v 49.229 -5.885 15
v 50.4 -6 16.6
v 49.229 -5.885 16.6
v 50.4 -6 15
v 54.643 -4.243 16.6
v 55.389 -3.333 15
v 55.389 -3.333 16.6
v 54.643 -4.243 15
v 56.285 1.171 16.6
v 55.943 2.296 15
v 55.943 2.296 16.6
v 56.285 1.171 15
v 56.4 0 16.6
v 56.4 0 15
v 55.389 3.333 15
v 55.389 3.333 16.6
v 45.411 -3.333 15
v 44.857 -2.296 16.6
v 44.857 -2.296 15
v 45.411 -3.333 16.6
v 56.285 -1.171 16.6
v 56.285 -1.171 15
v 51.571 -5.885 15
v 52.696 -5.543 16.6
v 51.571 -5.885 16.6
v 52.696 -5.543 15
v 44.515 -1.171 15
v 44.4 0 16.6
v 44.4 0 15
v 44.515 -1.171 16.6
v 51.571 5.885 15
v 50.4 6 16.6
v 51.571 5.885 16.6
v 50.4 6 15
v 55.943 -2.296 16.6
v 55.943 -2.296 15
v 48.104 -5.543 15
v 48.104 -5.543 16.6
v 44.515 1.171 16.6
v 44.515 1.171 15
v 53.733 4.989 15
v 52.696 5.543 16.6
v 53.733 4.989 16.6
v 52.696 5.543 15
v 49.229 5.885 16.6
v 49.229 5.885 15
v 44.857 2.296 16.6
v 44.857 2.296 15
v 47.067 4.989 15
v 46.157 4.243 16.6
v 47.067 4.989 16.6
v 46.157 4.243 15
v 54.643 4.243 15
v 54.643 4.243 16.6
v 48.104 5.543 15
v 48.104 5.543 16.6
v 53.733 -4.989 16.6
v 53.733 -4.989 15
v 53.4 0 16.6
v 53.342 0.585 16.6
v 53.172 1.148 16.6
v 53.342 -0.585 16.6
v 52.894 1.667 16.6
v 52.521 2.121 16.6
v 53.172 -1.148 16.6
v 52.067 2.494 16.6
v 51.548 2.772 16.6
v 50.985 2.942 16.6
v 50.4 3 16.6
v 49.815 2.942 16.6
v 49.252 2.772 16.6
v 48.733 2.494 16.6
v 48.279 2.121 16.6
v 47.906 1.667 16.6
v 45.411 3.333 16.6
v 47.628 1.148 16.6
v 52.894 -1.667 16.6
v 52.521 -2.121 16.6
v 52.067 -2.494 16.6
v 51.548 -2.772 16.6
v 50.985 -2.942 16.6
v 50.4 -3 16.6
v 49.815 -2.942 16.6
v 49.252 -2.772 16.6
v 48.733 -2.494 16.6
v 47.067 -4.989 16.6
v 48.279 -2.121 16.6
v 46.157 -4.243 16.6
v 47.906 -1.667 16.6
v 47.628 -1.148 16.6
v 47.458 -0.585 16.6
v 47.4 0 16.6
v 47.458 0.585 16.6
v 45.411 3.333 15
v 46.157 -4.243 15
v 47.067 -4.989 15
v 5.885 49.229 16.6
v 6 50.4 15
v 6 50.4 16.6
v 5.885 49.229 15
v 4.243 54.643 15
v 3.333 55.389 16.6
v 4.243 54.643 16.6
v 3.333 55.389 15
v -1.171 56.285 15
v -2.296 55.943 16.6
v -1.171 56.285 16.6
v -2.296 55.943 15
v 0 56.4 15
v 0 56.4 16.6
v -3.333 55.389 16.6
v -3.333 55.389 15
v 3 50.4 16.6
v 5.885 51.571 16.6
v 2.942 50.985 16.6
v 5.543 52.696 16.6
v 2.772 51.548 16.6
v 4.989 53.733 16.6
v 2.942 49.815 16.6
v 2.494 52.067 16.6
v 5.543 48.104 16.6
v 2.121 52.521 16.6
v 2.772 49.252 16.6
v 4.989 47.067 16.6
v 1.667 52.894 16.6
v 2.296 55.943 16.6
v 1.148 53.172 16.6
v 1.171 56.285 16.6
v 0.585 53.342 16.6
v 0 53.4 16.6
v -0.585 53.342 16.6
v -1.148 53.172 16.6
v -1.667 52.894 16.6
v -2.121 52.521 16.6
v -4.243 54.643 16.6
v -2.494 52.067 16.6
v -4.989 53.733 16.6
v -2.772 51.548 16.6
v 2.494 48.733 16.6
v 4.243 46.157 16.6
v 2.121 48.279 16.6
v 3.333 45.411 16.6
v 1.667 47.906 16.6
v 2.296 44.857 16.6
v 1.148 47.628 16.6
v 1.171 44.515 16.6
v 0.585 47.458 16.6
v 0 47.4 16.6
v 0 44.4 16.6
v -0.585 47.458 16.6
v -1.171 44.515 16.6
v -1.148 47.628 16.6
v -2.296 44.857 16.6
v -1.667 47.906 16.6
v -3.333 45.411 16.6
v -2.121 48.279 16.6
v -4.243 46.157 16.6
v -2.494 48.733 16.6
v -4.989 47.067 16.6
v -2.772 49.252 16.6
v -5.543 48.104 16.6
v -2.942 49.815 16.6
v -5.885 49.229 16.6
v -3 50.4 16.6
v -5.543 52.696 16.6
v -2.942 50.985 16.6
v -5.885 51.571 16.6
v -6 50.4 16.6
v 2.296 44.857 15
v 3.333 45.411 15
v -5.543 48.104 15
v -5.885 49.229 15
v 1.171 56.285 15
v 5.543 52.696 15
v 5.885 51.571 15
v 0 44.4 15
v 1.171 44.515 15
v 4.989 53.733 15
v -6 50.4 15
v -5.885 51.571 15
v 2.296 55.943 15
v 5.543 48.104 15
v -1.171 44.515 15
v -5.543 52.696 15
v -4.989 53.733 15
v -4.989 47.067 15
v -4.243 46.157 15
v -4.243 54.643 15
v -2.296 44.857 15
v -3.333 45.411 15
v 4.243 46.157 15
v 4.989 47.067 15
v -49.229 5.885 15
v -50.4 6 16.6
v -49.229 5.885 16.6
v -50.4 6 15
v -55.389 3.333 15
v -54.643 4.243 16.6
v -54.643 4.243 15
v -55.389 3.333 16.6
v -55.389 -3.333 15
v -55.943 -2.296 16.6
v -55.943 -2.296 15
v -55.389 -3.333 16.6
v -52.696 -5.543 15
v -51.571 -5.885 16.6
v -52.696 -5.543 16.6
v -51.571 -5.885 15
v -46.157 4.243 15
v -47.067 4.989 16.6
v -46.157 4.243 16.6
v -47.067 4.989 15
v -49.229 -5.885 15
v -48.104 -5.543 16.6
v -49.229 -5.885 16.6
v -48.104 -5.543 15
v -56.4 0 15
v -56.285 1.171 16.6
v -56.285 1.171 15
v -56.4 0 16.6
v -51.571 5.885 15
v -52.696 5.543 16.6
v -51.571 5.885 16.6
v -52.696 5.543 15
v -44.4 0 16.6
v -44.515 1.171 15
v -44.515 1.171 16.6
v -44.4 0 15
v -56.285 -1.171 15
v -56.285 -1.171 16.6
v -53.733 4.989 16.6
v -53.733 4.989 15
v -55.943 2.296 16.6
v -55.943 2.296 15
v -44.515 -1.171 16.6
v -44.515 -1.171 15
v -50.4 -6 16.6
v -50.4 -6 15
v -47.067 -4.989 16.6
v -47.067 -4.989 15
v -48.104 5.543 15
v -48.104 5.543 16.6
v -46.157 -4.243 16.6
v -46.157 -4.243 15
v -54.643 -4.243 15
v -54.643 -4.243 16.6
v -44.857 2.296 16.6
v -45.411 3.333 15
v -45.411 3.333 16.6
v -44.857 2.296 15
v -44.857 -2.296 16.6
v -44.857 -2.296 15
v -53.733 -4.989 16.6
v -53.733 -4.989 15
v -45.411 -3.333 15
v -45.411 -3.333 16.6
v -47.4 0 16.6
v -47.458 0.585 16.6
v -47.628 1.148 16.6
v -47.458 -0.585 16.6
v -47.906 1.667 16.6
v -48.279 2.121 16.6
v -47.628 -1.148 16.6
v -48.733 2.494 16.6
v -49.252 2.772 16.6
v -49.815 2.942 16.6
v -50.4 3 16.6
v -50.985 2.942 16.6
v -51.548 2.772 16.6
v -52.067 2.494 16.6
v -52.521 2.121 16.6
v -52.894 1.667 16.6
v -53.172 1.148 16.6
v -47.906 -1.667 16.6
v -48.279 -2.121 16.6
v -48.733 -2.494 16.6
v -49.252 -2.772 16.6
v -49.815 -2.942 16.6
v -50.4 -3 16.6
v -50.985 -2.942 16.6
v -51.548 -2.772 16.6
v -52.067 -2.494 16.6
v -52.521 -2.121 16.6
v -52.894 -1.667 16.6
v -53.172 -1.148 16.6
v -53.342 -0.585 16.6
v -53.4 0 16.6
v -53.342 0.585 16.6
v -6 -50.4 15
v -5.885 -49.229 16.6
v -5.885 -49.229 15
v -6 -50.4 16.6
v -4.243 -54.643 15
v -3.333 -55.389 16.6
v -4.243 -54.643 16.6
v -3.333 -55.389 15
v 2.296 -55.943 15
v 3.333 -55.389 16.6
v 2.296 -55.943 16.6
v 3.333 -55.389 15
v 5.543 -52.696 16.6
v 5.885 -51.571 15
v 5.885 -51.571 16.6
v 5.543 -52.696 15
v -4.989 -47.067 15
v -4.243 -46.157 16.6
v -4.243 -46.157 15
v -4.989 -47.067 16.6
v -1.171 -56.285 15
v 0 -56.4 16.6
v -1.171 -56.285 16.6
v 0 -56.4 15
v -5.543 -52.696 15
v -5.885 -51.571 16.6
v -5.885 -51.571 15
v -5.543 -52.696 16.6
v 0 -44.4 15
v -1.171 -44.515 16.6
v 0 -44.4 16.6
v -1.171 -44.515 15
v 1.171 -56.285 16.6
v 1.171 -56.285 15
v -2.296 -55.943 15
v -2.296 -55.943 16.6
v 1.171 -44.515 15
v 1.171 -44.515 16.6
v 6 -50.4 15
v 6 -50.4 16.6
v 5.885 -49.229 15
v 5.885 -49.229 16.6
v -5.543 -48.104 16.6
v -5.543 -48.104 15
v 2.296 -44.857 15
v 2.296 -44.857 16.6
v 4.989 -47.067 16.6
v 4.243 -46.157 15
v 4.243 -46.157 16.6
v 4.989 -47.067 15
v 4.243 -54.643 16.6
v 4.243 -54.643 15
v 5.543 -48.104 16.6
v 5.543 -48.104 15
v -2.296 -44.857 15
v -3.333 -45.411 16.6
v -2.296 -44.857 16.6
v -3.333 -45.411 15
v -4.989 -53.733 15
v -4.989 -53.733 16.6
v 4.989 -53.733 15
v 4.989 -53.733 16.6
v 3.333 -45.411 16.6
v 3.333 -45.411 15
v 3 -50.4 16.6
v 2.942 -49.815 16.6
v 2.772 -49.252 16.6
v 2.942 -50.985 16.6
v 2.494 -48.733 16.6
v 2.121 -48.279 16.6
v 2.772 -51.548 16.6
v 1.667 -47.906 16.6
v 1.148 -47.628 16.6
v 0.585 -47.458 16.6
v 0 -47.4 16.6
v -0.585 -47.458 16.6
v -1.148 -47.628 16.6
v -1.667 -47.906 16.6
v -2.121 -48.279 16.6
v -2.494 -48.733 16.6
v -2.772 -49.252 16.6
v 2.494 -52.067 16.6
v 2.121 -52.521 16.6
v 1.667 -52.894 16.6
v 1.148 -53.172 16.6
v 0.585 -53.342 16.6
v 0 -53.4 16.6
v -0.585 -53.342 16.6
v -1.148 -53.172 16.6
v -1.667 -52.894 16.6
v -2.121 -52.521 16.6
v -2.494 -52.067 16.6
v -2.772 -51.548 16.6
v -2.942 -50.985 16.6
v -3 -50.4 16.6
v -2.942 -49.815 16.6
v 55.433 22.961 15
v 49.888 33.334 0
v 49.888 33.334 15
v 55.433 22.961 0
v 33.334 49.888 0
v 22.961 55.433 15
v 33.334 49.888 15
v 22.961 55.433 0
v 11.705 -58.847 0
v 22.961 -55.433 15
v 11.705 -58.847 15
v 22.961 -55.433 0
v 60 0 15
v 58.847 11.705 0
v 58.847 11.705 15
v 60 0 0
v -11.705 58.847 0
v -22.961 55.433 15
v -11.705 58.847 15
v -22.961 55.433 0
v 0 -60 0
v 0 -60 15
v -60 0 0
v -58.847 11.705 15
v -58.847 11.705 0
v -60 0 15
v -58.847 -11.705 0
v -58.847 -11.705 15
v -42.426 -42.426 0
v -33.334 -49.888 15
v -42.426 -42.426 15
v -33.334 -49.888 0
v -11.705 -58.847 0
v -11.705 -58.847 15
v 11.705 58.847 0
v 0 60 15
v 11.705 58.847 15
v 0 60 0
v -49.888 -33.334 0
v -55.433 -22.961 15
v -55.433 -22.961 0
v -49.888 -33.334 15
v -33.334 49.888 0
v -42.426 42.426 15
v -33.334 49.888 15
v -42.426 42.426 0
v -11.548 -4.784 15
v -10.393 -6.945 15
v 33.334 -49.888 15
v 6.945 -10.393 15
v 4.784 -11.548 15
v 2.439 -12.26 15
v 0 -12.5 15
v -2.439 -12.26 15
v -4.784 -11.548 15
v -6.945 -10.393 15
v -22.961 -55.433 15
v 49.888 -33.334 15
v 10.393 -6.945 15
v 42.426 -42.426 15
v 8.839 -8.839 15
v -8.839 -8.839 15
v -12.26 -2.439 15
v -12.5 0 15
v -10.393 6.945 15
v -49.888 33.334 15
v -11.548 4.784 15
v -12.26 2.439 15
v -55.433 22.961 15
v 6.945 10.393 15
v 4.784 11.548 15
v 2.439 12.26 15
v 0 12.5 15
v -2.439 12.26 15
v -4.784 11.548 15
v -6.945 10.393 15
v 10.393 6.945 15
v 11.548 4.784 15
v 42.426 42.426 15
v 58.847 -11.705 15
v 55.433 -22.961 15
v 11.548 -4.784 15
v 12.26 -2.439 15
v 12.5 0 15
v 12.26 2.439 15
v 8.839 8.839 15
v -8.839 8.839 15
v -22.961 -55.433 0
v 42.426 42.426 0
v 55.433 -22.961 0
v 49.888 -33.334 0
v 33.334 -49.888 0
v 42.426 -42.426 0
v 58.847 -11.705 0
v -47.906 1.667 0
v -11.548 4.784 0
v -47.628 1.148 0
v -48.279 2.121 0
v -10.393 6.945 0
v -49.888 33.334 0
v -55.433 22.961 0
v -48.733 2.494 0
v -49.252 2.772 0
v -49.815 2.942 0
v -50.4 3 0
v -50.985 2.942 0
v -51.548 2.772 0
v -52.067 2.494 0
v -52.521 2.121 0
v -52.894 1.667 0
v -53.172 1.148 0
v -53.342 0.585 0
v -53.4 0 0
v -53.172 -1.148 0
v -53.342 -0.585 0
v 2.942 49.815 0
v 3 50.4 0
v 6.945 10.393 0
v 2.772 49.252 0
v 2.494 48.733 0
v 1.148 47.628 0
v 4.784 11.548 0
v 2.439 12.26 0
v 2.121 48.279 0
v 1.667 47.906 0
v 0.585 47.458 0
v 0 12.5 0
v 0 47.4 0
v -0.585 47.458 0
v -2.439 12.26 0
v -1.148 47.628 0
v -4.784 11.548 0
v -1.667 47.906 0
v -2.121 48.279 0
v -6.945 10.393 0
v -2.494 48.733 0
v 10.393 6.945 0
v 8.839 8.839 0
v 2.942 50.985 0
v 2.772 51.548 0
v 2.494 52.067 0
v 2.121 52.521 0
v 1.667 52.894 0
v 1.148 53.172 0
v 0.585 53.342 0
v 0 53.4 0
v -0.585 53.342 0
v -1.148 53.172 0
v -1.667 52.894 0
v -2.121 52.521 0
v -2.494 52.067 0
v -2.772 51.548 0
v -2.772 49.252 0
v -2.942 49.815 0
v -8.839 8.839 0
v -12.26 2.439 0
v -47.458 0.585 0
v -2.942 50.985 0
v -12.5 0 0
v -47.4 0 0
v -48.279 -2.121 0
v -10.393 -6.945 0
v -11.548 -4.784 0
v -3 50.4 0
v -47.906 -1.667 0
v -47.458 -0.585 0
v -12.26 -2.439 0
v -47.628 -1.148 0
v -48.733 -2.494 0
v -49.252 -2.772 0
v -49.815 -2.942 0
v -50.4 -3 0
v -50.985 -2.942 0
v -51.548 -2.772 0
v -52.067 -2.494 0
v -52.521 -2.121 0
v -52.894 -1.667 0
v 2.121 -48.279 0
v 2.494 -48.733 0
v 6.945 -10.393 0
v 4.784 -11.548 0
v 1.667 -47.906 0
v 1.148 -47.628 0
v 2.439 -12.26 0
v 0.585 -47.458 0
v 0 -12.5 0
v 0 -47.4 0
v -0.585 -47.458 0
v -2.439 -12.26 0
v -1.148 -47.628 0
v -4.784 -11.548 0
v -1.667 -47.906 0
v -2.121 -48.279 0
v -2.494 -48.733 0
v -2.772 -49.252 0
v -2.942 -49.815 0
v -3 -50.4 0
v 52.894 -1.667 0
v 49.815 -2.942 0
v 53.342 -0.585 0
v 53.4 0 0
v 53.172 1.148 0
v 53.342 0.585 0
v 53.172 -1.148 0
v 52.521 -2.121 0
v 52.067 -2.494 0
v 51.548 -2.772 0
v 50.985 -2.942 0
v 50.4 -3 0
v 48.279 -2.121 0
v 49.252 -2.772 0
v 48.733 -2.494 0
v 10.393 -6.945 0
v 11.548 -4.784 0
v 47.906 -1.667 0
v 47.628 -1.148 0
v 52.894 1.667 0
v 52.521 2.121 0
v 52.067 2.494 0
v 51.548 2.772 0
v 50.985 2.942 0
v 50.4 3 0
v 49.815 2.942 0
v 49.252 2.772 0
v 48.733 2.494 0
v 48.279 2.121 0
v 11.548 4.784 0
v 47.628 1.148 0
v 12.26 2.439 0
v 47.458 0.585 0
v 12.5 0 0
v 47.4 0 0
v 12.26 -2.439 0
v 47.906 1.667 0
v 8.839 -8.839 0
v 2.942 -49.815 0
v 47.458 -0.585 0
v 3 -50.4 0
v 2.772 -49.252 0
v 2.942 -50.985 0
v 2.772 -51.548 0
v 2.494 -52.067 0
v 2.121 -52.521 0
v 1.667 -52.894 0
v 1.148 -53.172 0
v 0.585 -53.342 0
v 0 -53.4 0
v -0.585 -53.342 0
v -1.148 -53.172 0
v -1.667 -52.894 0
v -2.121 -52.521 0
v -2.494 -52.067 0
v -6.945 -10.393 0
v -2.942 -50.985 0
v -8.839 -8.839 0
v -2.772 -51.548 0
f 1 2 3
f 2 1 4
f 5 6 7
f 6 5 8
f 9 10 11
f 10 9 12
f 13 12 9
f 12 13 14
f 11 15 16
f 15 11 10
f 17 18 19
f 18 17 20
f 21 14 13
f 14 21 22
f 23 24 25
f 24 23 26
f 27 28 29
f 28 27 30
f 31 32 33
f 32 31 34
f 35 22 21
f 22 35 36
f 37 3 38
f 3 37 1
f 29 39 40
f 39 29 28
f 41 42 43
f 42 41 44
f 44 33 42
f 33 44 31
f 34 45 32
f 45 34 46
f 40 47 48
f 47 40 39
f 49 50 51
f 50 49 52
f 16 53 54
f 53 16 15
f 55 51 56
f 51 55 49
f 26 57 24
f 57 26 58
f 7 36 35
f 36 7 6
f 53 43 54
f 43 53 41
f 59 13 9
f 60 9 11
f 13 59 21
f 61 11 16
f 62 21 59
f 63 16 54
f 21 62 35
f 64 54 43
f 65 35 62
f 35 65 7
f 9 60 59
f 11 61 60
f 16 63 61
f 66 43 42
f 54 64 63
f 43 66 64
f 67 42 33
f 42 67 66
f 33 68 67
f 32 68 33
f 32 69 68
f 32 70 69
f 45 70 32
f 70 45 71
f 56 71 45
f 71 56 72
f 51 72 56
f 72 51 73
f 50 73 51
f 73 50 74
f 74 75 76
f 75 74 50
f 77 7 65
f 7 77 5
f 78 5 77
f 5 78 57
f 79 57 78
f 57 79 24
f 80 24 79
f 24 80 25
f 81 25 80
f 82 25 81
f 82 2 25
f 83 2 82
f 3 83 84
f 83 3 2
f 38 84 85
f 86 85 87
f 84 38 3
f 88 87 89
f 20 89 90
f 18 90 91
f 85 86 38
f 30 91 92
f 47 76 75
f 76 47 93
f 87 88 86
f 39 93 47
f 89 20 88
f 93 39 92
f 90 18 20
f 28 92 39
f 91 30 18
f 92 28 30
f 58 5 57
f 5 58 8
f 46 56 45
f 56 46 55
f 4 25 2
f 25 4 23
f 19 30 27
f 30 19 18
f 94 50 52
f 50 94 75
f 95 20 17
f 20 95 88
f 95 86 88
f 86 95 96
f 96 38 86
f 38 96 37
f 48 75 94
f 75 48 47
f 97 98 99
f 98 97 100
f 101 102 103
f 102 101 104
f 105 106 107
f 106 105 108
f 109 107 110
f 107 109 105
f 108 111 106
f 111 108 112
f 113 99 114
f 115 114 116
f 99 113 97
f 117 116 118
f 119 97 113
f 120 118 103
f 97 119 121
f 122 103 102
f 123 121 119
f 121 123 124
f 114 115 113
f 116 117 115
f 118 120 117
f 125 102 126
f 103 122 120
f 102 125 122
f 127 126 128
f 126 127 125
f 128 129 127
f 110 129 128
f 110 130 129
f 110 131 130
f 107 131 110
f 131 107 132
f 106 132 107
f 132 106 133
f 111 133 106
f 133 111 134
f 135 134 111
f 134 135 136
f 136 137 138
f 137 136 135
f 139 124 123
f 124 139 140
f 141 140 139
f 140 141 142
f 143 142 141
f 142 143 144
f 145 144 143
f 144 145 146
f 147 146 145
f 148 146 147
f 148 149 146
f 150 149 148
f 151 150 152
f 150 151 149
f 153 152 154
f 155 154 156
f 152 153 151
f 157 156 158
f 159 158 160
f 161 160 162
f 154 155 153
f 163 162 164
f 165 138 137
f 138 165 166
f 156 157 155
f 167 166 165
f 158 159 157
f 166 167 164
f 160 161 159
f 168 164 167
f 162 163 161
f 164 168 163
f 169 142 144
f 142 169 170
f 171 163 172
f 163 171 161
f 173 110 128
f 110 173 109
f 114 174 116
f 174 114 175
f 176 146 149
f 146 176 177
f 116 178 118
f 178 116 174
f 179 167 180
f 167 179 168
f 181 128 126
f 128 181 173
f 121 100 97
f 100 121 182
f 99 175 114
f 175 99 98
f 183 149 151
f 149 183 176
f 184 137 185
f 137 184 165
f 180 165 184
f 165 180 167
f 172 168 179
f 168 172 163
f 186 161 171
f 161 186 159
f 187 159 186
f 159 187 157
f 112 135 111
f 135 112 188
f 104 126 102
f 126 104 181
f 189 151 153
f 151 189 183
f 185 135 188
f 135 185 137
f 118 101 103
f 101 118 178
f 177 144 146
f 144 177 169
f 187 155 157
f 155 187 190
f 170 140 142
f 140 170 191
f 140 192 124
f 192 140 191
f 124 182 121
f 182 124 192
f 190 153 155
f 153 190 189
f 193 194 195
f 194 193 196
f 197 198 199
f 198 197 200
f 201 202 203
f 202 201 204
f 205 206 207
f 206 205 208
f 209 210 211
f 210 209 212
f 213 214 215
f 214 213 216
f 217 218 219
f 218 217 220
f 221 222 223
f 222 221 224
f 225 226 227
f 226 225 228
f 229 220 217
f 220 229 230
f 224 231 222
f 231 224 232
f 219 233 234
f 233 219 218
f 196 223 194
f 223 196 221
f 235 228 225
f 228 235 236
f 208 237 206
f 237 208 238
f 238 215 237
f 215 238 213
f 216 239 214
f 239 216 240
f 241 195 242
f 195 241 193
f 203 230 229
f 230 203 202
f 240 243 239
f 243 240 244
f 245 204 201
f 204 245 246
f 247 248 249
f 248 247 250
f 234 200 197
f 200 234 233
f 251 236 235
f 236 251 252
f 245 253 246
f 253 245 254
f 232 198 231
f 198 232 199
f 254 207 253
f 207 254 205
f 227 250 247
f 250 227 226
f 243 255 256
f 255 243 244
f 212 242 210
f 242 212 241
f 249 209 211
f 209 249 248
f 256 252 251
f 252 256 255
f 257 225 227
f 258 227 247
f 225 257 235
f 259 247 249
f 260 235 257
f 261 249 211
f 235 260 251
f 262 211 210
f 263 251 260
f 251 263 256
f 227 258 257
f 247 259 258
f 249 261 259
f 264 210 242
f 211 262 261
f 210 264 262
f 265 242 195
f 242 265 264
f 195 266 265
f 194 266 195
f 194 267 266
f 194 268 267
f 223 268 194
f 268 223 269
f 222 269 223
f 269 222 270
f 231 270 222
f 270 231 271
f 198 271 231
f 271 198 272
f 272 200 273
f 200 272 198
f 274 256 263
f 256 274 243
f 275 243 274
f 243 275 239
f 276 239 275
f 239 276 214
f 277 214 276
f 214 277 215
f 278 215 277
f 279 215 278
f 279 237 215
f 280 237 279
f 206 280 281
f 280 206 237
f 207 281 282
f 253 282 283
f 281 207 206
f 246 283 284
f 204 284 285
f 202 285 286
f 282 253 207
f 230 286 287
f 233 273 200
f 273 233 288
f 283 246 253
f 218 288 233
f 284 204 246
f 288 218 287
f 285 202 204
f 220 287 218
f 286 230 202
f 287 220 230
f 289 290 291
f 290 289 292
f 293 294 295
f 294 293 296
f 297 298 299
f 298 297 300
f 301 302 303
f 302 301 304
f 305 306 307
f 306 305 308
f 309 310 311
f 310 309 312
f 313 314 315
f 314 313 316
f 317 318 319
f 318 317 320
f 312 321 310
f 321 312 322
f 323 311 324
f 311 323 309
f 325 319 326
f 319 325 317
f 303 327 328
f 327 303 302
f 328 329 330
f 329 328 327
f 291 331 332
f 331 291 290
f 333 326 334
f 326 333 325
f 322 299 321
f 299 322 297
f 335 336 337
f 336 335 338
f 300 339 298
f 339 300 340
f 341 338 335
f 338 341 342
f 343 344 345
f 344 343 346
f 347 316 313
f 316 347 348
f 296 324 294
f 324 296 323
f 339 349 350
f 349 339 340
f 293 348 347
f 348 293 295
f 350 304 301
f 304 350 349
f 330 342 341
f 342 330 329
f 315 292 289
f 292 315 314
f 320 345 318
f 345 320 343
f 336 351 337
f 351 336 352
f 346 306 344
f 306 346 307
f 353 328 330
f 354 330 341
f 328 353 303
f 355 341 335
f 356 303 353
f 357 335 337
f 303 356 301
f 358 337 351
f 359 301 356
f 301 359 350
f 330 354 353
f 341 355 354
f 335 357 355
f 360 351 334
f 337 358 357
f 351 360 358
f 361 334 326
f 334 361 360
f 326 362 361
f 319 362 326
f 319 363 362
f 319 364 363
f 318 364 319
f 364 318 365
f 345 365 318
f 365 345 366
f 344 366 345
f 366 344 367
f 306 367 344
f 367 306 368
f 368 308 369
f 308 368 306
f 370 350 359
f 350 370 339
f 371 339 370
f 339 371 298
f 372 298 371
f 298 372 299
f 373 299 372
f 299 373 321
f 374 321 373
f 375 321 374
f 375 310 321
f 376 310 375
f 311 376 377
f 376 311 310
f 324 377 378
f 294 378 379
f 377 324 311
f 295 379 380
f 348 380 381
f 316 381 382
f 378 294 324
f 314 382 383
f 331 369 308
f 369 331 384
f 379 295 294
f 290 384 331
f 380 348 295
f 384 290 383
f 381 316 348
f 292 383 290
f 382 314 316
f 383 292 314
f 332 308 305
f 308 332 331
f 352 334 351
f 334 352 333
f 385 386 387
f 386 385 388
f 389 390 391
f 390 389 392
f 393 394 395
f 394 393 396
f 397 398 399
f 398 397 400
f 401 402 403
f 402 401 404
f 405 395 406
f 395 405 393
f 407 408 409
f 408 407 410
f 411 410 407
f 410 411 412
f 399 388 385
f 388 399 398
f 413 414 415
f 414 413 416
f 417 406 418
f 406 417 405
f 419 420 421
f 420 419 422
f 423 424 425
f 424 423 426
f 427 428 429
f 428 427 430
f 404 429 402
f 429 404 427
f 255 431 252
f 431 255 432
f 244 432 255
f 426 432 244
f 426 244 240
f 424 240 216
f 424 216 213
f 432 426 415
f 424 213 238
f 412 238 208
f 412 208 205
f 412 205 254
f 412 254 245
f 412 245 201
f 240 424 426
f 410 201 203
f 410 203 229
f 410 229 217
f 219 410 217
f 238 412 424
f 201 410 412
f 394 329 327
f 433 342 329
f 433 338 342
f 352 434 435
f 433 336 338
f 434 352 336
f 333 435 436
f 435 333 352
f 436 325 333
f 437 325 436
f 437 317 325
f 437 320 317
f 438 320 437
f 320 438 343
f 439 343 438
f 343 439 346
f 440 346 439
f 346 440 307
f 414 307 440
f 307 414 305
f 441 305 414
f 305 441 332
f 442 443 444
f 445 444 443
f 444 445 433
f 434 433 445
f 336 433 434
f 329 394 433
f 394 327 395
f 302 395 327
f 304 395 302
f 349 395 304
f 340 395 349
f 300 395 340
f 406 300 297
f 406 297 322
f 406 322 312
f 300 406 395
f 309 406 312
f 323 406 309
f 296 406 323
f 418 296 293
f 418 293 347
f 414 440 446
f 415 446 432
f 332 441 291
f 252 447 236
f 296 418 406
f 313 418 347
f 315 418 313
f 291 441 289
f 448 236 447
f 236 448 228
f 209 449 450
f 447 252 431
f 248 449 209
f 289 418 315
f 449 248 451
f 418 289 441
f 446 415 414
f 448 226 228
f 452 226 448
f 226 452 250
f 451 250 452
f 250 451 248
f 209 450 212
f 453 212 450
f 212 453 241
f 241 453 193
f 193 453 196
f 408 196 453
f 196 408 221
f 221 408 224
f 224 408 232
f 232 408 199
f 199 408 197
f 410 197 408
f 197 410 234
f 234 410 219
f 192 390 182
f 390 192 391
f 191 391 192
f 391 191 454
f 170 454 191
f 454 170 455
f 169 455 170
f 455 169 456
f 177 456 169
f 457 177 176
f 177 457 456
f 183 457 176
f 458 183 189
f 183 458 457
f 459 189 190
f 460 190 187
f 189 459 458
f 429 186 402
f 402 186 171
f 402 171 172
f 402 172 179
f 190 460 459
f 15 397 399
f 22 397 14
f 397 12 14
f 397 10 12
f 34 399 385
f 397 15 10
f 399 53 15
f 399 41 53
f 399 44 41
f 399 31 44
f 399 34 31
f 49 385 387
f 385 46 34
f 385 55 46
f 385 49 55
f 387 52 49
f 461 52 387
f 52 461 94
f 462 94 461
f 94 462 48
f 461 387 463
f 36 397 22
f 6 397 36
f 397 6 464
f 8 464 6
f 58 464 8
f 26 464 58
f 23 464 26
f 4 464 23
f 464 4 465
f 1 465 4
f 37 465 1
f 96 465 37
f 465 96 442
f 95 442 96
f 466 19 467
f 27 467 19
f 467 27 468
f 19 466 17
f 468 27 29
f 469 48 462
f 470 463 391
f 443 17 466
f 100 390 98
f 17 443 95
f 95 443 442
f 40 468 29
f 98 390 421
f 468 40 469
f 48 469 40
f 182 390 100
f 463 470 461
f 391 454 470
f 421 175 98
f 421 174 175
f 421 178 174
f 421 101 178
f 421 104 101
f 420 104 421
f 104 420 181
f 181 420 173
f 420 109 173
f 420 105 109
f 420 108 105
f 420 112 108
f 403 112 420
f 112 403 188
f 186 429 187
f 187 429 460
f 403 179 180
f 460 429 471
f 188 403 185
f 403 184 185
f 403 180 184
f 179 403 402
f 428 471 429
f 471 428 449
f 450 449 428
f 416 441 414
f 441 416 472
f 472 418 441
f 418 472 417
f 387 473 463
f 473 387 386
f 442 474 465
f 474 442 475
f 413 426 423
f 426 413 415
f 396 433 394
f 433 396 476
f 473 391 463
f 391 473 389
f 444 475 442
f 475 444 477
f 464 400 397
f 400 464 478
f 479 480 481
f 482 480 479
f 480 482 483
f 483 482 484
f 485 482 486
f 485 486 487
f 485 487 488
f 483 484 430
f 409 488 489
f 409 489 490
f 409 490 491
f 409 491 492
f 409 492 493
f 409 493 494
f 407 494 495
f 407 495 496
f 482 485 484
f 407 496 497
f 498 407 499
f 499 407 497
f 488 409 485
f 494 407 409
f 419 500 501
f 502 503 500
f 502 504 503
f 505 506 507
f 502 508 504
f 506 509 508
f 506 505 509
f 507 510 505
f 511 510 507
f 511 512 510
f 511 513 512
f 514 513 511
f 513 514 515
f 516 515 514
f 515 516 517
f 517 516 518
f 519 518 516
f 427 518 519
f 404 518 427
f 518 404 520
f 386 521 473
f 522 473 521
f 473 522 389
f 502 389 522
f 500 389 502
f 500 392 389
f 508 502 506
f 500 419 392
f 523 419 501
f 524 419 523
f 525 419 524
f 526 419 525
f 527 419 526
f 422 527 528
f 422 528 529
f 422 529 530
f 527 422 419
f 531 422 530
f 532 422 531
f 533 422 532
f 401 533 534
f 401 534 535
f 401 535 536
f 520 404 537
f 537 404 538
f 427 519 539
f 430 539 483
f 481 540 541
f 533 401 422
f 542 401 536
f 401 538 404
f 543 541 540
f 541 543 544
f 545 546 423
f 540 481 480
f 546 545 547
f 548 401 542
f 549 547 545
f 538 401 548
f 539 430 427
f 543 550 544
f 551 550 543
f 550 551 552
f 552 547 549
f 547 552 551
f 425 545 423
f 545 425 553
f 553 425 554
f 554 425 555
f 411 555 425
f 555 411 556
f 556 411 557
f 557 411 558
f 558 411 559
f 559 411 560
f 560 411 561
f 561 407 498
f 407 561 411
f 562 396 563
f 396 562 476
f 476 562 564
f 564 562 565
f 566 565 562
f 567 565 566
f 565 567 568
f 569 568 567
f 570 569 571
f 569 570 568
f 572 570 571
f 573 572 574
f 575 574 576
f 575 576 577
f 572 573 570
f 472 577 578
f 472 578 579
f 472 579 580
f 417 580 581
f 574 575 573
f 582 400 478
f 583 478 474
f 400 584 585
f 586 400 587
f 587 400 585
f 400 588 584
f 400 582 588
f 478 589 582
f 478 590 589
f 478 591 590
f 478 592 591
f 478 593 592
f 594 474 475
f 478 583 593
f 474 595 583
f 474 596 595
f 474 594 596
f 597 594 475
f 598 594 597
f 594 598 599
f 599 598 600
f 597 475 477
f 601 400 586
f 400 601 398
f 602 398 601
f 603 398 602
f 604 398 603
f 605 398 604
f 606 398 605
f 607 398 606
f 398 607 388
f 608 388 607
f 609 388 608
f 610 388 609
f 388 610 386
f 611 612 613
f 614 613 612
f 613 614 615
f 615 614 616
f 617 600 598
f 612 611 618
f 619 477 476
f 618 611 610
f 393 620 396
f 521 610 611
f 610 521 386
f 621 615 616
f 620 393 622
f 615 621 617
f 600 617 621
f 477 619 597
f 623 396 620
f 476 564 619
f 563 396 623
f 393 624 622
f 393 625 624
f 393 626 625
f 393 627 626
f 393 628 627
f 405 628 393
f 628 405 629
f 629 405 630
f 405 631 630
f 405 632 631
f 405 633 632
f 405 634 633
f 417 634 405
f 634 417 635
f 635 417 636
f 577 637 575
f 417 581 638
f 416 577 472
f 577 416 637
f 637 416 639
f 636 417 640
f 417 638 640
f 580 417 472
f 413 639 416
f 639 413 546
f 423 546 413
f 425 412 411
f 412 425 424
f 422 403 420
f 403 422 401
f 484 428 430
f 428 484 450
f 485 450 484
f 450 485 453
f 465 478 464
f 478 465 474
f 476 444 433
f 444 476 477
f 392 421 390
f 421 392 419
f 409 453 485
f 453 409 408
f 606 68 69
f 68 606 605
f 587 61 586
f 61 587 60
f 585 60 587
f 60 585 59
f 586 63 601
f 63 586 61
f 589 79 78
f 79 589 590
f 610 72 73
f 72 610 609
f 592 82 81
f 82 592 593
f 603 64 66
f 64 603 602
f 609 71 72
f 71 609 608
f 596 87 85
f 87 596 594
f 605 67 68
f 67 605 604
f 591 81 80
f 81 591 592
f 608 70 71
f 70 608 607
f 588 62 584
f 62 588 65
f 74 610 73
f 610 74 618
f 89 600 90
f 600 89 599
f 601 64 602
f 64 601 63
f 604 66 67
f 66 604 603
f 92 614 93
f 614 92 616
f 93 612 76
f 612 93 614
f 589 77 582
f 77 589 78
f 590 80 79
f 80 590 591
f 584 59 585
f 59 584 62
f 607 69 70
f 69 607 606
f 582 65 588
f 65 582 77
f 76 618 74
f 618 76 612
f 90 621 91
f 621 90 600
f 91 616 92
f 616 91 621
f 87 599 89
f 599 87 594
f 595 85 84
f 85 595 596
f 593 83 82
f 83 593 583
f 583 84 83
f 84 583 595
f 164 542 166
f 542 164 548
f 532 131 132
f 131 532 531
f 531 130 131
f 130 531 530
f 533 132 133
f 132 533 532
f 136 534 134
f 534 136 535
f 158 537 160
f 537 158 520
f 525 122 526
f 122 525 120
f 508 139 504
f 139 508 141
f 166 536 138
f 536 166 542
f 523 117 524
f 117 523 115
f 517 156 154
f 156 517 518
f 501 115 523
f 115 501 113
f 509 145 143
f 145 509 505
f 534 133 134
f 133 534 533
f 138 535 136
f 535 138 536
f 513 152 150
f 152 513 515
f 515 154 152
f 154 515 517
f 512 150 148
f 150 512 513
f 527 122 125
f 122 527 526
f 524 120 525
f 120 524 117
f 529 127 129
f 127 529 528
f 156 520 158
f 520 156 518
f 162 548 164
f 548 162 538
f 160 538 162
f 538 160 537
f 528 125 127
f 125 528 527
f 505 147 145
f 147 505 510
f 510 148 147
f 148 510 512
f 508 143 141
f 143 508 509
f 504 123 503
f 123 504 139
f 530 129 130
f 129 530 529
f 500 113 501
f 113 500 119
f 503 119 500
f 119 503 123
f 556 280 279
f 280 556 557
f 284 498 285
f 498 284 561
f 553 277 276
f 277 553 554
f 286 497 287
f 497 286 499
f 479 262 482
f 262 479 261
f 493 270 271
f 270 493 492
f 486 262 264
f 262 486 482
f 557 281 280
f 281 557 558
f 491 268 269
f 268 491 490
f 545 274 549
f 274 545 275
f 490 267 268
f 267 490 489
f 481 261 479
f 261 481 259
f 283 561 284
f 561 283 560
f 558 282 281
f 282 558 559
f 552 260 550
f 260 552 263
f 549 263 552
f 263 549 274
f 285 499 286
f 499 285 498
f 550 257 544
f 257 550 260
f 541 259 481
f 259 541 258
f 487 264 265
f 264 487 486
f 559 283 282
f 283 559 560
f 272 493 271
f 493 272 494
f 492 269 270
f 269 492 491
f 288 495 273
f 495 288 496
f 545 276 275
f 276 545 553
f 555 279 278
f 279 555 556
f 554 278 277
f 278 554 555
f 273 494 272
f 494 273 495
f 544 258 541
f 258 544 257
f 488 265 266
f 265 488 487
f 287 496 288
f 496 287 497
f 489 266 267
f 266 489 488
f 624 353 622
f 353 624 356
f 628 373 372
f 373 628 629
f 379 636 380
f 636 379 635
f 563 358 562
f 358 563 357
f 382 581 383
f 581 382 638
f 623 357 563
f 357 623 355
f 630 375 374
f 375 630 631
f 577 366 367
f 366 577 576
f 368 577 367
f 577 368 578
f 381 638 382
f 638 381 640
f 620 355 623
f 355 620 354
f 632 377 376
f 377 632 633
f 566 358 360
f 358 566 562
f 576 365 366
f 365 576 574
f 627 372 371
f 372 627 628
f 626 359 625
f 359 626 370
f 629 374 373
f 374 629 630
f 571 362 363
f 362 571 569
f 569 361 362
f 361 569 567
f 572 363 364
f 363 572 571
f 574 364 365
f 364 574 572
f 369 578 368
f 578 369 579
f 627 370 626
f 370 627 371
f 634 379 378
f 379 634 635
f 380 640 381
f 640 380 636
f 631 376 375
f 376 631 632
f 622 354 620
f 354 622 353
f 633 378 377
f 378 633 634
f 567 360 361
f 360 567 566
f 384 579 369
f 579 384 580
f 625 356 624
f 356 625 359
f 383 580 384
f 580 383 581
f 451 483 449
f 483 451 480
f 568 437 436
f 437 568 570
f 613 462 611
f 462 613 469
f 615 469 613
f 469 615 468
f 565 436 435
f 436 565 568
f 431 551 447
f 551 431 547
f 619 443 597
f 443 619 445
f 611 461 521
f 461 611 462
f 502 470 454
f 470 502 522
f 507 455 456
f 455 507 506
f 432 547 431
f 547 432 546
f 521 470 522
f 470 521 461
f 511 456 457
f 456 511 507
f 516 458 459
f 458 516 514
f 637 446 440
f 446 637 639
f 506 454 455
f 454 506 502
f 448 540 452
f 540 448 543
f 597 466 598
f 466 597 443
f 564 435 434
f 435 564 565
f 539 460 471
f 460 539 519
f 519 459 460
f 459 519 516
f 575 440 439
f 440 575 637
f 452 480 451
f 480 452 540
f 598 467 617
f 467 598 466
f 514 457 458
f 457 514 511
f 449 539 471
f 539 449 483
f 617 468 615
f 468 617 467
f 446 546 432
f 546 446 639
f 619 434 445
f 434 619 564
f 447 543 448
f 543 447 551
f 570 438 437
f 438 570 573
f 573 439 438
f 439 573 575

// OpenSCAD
$fn = 32;

// ----------------------------------------------------------------------
// Bolt-circle flange: 120 mm outside, 4 bolt holes, bore 25 mm
// ----------------------------------------------------------------------

// --- parameters (mm) ---
flange_d = 120;           // flange outside diameter
flange_t = 15;            // flange thickness
bolts = 4;                // number of bolt holes
bolt_d = 6;               // bolt clearance
bolt_r = 50.4;            // bolt circle radius
bore_d = 25;              // centre bore
spot_d = 12;              // spot faced bosses
spot_h = 1.6;             // spot face height

module body() {
  cylinder(h = flange_t, d = flange_d);
  /* spot faced pads under the bolt heads */
  for (i = [0 : bolts - 1]) rotate([0, 0, i * 360 / bolts]) translate([bolt_r, 0, flange_t - 1]) cylinder(h = spot_h + 1, d = spot_d);
}

difference() {
  body();
  /* bolt circle */
  for (i = [0 : bolts - 1]) rotate([0, 0, i * 360 / bolts]) translate([bolt_r, 0, -1]) cylinder(h = flange_t + 3, d = bolt_d);
  translate([0, 0, -1]) cylinder(h = flange_t + 3, d = bore_d);
}
